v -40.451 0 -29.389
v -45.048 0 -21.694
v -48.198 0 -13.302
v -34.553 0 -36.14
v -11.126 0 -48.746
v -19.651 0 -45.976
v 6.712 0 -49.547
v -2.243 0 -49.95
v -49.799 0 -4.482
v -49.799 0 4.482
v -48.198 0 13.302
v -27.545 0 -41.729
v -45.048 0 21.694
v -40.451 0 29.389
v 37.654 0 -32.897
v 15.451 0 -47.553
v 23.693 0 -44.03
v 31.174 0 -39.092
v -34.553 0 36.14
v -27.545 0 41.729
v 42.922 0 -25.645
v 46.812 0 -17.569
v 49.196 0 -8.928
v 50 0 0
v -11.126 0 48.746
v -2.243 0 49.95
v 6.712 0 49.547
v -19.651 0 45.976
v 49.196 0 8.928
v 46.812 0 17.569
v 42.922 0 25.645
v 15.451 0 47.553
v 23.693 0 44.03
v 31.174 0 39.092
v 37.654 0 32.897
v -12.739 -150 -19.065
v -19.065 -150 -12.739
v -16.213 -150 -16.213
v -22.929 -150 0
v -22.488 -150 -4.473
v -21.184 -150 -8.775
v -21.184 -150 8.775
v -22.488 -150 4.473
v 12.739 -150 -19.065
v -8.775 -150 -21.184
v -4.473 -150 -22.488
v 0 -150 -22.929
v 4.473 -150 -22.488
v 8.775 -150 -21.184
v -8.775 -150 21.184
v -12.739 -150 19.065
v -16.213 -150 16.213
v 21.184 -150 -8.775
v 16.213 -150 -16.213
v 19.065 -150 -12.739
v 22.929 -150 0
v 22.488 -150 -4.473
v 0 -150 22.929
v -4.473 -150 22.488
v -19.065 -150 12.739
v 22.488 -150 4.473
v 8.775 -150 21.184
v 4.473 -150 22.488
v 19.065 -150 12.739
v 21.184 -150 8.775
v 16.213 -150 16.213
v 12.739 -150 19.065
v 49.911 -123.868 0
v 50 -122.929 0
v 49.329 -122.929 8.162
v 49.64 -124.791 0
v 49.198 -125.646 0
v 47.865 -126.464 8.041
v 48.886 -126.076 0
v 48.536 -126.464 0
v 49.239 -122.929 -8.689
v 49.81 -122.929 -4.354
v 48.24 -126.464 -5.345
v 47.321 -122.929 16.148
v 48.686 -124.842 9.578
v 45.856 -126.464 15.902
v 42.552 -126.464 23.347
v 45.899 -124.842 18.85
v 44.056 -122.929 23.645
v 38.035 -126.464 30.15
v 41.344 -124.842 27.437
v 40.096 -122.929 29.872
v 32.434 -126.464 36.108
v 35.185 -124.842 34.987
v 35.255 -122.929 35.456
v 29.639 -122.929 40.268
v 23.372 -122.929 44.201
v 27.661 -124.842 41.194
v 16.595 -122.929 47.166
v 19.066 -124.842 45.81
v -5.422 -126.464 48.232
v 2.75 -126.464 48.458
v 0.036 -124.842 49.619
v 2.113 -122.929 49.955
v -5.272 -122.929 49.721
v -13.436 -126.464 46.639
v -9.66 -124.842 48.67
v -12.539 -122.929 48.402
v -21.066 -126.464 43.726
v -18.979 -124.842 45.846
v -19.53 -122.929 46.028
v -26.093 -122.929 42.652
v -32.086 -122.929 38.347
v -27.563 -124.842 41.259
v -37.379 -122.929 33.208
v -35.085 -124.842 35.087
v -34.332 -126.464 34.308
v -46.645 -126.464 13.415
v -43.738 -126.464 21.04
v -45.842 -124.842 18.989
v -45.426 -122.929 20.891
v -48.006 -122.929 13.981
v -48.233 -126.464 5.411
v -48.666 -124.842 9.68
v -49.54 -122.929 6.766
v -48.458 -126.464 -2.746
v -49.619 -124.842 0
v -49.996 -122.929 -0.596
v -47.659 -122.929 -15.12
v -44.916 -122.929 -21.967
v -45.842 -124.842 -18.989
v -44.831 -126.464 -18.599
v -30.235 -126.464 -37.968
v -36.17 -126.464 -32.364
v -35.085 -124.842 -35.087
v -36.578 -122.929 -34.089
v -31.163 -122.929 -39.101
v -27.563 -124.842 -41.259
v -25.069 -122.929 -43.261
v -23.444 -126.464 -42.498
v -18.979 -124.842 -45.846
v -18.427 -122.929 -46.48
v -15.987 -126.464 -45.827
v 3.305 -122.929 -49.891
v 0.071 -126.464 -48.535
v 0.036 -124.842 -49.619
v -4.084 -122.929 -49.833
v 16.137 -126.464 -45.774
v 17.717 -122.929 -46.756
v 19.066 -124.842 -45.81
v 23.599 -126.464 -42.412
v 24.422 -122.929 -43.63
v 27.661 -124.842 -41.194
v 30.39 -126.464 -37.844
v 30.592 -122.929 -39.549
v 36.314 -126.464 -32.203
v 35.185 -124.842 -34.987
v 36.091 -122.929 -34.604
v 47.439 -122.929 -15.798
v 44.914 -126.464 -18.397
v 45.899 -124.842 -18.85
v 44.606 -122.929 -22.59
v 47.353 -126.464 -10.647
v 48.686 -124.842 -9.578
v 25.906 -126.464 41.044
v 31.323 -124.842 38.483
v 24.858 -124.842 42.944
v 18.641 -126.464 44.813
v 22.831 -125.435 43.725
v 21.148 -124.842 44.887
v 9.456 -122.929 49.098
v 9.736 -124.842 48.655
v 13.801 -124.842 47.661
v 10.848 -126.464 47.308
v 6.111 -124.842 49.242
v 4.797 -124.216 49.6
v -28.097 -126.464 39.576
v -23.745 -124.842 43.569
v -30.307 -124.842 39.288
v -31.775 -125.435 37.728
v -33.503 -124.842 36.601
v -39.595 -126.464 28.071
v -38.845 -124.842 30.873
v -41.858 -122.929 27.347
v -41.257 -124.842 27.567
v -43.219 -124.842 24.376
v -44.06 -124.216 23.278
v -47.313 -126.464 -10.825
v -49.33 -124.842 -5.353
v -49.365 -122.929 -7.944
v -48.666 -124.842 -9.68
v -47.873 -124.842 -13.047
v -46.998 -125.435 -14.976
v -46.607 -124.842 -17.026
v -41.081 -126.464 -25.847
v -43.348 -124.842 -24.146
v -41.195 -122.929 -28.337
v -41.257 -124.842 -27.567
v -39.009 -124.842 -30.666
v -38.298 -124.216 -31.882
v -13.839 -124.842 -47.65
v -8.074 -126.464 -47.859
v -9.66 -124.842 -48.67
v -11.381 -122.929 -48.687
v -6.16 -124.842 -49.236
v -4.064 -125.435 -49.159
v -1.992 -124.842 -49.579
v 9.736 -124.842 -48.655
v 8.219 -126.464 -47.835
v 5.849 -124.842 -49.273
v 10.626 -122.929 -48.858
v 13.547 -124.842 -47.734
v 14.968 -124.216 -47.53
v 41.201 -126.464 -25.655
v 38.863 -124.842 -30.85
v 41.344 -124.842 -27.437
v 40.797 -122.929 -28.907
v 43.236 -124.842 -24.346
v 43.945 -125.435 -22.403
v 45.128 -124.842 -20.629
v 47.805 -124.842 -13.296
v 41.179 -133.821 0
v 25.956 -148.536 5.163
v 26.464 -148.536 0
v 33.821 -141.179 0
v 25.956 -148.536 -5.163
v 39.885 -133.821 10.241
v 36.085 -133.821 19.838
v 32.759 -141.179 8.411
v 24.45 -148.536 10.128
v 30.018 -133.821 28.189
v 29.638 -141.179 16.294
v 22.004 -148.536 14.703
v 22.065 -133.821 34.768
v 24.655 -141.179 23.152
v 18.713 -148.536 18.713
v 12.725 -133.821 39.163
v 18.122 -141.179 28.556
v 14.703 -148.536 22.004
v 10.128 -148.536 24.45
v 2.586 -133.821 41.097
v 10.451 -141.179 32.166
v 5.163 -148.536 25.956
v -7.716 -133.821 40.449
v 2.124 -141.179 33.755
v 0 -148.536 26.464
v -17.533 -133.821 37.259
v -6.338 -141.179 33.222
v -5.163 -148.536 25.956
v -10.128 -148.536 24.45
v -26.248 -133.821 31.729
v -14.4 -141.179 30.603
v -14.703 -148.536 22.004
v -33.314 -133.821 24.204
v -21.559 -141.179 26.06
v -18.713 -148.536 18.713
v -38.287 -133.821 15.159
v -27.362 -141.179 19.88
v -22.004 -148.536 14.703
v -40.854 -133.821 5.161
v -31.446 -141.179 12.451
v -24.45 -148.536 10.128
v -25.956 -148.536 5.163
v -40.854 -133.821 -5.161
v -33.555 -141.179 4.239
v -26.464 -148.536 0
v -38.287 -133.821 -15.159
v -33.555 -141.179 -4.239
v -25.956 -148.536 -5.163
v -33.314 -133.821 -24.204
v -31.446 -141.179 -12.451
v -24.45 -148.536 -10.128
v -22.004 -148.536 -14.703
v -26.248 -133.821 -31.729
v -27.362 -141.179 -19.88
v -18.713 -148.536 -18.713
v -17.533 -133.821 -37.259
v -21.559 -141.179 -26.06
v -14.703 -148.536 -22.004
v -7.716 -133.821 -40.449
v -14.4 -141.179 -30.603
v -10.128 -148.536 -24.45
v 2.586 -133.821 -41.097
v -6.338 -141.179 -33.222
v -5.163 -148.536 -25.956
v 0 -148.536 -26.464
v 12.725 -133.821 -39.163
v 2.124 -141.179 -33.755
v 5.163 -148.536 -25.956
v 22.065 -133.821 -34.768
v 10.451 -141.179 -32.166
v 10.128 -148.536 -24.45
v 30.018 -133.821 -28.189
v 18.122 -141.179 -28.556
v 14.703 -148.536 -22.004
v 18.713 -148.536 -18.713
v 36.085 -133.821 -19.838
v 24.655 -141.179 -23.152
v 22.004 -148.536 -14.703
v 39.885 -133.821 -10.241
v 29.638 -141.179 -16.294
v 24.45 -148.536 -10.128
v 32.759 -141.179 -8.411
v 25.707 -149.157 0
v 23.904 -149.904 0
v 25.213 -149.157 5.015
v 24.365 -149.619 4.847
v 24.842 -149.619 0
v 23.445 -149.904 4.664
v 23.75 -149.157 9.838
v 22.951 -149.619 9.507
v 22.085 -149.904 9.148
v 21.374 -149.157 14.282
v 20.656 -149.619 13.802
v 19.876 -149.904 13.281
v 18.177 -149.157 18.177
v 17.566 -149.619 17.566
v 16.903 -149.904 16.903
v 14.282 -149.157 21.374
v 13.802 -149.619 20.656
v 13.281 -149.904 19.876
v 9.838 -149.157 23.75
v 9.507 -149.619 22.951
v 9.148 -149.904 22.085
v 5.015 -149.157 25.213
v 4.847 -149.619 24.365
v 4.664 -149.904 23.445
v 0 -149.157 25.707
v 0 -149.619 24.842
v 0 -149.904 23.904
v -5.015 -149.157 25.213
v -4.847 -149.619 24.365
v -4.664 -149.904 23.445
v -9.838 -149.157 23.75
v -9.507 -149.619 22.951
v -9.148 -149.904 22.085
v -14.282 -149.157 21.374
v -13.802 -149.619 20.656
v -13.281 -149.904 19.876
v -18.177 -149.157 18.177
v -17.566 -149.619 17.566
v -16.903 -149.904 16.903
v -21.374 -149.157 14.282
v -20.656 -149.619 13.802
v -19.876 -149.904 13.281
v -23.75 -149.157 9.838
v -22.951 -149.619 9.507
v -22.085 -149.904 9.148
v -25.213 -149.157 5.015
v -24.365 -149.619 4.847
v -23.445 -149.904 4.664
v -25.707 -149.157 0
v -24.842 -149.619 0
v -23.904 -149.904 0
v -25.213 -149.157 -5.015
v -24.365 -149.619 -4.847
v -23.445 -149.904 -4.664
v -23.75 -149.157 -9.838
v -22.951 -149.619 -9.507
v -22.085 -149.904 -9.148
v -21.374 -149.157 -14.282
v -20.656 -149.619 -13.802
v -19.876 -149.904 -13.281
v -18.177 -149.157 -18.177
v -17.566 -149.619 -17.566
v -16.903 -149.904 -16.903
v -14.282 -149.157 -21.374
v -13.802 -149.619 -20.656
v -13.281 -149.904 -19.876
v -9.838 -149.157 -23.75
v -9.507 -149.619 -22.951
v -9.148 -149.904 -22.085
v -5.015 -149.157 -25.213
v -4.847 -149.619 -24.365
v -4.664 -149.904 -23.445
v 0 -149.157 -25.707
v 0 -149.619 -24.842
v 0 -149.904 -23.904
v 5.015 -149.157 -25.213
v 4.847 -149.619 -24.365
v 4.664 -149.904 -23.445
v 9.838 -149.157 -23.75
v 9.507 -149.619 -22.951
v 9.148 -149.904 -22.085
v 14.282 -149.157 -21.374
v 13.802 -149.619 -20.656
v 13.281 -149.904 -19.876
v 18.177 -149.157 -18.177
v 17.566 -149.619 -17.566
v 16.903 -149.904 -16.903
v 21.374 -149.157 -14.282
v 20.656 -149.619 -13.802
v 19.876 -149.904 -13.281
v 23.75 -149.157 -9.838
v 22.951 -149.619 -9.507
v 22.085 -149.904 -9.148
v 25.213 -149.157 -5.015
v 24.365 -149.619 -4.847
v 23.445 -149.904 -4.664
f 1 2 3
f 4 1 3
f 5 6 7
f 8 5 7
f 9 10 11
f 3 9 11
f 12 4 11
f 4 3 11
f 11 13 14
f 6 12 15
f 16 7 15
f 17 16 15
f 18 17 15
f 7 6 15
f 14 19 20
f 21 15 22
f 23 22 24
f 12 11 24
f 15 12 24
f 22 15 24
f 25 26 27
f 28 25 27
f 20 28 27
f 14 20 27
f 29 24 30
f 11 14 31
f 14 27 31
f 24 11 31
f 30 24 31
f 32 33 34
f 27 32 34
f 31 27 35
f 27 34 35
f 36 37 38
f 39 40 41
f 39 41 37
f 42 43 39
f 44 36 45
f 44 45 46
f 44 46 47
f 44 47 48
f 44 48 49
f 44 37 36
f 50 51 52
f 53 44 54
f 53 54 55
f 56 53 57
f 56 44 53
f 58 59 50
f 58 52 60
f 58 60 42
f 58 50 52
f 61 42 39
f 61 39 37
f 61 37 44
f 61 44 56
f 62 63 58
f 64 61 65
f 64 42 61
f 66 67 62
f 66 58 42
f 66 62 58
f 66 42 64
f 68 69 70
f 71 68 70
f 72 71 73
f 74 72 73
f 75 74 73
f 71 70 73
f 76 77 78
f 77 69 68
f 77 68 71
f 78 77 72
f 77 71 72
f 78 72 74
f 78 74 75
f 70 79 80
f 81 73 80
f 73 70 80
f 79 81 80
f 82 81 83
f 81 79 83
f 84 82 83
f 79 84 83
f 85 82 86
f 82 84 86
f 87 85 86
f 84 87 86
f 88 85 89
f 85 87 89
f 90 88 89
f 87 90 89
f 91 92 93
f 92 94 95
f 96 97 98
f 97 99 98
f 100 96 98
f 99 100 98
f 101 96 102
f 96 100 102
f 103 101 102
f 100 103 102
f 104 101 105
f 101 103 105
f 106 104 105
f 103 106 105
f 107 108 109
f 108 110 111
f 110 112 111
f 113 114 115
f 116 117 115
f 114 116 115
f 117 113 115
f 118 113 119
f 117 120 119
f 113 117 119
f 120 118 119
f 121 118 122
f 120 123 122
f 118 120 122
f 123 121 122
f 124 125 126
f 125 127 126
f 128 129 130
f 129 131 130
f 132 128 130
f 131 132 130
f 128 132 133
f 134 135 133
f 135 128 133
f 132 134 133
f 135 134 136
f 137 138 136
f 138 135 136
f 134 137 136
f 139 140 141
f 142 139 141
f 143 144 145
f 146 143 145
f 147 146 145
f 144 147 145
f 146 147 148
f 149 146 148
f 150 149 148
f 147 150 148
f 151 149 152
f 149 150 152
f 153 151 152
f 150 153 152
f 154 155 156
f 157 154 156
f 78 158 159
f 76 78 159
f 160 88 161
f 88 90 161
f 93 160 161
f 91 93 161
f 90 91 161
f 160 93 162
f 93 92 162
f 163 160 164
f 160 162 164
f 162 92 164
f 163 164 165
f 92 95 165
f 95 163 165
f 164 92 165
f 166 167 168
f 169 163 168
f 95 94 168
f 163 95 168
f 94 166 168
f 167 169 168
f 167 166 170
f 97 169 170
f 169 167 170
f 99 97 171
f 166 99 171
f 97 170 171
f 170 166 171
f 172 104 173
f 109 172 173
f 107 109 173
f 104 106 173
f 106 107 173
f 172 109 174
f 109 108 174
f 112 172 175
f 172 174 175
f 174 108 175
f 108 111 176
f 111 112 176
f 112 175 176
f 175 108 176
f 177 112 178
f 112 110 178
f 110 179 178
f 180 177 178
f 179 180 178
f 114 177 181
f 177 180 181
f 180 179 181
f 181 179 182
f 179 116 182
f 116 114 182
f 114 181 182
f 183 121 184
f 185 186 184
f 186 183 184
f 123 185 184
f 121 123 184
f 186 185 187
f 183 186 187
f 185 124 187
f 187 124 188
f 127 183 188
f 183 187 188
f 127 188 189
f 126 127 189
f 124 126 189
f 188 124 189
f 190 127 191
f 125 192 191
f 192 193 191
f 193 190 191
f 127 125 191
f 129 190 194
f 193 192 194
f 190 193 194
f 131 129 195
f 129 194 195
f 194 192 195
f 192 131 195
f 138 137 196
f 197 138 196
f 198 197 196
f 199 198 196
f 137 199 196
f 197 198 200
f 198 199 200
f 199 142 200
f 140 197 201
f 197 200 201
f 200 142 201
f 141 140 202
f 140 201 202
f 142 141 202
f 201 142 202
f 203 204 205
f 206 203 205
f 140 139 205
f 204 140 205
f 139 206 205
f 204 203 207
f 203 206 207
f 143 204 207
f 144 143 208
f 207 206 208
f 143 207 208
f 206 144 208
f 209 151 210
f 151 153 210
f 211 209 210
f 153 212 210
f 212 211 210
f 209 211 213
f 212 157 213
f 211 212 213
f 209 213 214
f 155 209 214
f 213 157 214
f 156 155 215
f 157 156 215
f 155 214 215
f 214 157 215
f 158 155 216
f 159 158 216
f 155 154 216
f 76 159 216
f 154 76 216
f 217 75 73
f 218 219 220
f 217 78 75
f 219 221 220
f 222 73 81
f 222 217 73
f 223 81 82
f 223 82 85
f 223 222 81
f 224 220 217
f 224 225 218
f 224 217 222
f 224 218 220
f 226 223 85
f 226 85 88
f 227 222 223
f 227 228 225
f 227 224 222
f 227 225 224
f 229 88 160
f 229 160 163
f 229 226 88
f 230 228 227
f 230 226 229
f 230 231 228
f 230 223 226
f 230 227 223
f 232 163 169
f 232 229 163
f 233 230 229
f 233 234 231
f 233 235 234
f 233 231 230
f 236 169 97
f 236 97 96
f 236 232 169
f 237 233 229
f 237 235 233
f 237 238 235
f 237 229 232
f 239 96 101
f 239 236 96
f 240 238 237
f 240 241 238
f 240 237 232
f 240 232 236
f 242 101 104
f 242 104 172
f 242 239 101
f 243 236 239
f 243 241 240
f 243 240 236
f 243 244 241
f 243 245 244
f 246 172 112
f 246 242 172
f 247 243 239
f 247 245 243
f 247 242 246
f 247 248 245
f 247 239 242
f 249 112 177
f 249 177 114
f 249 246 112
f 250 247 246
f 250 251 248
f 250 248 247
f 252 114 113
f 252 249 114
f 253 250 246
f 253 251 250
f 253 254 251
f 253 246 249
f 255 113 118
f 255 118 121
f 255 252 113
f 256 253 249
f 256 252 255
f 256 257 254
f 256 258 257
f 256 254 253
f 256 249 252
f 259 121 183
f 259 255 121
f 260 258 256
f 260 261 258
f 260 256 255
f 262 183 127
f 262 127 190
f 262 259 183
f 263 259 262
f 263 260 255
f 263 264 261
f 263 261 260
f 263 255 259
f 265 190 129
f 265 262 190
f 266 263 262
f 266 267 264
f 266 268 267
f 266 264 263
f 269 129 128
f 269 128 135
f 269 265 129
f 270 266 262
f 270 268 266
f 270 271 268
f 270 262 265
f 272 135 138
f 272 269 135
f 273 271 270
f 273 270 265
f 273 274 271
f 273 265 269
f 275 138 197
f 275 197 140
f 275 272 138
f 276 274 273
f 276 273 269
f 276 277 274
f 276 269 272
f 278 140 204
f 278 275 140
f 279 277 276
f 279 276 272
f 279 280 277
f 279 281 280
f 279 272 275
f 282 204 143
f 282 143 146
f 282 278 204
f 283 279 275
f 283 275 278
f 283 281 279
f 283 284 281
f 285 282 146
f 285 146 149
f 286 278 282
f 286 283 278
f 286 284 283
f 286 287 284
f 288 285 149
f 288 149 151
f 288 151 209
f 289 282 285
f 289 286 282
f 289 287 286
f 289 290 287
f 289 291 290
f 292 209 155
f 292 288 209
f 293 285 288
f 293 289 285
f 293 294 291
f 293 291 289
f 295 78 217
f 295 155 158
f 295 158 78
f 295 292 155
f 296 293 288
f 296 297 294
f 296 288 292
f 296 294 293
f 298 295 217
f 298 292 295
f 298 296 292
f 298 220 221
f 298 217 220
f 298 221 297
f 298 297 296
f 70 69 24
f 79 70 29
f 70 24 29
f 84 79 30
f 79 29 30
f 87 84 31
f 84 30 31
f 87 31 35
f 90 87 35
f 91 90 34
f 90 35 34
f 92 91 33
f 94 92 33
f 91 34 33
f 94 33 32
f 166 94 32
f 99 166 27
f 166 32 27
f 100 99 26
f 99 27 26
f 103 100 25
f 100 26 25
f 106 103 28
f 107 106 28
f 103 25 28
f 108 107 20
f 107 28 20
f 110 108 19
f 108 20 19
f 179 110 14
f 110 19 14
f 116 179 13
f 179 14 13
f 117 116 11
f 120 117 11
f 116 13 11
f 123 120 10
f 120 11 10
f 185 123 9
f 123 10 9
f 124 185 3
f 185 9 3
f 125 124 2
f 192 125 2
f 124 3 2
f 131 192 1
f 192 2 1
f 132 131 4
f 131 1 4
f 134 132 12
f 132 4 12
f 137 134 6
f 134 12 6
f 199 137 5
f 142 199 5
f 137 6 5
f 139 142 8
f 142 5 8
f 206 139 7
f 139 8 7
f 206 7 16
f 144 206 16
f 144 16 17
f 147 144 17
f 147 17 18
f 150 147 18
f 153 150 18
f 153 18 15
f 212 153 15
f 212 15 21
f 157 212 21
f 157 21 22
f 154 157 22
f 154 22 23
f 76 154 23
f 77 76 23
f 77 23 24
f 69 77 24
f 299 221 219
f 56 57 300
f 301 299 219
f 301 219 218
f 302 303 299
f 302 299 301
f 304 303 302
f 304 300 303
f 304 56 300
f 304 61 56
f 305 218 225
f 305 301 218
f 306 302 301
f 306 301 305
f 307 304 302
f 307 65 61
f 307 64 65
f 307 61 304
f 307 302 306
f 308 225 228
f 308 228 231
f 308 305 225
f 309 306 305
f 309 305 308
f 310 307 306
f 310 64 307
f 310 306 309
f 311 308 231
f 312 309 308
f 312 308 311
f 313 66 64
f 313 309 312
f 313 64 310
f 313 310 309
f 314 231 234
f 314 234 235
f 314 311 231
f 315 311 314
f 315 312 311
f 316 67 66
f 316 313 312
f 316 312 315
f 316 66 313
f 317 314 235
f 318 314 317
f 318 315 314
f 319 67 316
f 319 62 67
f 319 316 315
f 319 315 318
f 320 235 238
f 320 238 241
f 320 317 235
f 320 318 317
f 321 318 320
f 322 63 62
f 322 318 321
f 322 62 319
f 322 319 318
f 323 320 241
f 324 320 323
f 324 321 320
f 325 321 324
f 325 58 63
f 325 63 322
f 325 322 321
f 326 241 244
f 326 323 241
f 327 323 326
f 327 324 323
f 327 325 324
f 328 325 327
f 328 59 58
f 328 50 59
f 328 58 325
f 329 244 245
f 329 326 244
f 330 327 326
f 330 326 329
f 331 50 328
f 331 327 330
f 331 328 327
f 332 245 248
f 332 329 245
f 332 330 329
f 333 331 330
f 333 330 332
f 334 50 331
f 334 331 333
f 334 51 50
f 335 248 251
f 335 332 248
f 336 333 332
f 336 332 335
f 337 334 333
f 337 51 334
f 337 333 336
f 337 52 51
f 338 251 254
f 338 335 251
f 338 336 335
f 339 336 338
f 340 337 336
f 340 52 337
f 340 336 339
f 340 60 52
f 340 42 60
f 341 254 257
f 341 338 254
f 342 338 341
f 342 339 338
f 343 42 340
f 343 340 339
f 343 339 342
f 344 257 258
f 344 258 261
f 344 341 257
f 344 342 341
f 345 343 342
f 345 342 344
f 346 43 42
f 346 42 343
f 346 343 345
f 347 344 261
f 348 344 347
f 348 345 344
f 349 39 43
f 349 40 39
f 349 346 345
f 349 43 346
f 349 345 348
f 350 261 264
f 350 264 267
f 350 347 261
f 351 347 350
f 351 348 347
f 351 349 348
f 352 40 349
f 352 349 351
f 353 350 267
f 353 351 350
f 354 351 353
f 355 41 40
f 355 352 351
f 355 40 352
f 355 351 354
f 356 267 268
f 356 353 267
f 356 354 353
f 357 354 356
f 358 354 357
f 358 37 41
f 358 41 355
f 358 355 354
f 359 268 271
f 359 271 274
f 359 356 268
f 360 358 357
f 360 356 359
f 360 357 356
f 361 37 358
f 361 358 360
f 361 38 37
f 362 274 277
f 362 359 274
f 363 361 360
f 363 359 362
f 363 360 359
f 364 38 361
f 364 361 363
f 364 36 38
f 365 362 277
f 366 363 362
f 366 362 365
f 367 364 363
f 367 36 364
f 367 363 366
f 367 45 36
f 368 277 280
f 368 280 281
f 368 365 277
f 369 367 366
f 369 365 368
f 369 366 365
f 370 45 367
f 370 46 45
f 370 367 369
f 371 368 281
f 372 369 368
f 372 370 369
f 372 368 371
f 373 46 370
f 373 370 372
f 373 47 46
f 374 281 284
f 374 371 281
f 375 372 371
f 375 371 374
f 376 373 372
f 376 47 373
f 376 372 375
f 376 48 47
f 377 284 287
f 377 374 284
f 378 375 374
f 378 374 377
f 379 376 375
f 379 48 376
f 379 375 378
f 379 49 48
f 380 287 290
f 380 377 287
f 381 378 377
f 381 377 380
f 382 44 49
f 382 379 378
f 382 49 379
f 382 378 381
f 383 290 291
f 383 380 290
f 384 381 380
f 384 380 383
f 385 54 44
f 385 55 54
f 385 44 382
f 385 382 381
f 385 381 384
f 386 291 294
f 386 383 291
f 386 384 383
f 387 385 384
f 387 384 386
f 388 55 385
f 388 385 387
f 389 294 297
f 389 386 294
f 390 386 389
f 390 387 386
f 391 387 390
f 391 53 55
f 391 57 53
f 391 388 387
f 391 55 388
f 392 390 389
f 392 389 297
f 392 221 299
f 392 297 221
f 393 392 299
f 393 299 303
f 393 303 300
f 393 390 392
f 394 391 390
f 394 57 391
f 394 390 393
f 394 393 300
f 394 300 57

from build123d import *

# Parameters (mm, degrees)
F0_R     = 50
F1_DEPTH = 150
F2_SIZE  = 25
F3_R     = 5


with BuildPart() as f1:
    # F0 (on Front) → F1 (new body)
    with BuildSketch(Plane.XZ):
        Circle(F0_R)
    extrude(amount=F1_DEPTH)

    # F2
    f2_edges = [f1.edges().sort_by_distance(p)[0] for p in [
        (-50, -150, 0),
    ]]
    chamfer(f2_edges, length=F2_SIZE)

    # F3
    f3_edges = [f1.edges().sort_by_distance(p)[0] for p in [
        (37.5, -137.5, 0),
        (-50, -125, 0),
        (-25, -150, 0),
    ]]
    fillet(f3_edges, radius=F3_R)


solid = f1.part
